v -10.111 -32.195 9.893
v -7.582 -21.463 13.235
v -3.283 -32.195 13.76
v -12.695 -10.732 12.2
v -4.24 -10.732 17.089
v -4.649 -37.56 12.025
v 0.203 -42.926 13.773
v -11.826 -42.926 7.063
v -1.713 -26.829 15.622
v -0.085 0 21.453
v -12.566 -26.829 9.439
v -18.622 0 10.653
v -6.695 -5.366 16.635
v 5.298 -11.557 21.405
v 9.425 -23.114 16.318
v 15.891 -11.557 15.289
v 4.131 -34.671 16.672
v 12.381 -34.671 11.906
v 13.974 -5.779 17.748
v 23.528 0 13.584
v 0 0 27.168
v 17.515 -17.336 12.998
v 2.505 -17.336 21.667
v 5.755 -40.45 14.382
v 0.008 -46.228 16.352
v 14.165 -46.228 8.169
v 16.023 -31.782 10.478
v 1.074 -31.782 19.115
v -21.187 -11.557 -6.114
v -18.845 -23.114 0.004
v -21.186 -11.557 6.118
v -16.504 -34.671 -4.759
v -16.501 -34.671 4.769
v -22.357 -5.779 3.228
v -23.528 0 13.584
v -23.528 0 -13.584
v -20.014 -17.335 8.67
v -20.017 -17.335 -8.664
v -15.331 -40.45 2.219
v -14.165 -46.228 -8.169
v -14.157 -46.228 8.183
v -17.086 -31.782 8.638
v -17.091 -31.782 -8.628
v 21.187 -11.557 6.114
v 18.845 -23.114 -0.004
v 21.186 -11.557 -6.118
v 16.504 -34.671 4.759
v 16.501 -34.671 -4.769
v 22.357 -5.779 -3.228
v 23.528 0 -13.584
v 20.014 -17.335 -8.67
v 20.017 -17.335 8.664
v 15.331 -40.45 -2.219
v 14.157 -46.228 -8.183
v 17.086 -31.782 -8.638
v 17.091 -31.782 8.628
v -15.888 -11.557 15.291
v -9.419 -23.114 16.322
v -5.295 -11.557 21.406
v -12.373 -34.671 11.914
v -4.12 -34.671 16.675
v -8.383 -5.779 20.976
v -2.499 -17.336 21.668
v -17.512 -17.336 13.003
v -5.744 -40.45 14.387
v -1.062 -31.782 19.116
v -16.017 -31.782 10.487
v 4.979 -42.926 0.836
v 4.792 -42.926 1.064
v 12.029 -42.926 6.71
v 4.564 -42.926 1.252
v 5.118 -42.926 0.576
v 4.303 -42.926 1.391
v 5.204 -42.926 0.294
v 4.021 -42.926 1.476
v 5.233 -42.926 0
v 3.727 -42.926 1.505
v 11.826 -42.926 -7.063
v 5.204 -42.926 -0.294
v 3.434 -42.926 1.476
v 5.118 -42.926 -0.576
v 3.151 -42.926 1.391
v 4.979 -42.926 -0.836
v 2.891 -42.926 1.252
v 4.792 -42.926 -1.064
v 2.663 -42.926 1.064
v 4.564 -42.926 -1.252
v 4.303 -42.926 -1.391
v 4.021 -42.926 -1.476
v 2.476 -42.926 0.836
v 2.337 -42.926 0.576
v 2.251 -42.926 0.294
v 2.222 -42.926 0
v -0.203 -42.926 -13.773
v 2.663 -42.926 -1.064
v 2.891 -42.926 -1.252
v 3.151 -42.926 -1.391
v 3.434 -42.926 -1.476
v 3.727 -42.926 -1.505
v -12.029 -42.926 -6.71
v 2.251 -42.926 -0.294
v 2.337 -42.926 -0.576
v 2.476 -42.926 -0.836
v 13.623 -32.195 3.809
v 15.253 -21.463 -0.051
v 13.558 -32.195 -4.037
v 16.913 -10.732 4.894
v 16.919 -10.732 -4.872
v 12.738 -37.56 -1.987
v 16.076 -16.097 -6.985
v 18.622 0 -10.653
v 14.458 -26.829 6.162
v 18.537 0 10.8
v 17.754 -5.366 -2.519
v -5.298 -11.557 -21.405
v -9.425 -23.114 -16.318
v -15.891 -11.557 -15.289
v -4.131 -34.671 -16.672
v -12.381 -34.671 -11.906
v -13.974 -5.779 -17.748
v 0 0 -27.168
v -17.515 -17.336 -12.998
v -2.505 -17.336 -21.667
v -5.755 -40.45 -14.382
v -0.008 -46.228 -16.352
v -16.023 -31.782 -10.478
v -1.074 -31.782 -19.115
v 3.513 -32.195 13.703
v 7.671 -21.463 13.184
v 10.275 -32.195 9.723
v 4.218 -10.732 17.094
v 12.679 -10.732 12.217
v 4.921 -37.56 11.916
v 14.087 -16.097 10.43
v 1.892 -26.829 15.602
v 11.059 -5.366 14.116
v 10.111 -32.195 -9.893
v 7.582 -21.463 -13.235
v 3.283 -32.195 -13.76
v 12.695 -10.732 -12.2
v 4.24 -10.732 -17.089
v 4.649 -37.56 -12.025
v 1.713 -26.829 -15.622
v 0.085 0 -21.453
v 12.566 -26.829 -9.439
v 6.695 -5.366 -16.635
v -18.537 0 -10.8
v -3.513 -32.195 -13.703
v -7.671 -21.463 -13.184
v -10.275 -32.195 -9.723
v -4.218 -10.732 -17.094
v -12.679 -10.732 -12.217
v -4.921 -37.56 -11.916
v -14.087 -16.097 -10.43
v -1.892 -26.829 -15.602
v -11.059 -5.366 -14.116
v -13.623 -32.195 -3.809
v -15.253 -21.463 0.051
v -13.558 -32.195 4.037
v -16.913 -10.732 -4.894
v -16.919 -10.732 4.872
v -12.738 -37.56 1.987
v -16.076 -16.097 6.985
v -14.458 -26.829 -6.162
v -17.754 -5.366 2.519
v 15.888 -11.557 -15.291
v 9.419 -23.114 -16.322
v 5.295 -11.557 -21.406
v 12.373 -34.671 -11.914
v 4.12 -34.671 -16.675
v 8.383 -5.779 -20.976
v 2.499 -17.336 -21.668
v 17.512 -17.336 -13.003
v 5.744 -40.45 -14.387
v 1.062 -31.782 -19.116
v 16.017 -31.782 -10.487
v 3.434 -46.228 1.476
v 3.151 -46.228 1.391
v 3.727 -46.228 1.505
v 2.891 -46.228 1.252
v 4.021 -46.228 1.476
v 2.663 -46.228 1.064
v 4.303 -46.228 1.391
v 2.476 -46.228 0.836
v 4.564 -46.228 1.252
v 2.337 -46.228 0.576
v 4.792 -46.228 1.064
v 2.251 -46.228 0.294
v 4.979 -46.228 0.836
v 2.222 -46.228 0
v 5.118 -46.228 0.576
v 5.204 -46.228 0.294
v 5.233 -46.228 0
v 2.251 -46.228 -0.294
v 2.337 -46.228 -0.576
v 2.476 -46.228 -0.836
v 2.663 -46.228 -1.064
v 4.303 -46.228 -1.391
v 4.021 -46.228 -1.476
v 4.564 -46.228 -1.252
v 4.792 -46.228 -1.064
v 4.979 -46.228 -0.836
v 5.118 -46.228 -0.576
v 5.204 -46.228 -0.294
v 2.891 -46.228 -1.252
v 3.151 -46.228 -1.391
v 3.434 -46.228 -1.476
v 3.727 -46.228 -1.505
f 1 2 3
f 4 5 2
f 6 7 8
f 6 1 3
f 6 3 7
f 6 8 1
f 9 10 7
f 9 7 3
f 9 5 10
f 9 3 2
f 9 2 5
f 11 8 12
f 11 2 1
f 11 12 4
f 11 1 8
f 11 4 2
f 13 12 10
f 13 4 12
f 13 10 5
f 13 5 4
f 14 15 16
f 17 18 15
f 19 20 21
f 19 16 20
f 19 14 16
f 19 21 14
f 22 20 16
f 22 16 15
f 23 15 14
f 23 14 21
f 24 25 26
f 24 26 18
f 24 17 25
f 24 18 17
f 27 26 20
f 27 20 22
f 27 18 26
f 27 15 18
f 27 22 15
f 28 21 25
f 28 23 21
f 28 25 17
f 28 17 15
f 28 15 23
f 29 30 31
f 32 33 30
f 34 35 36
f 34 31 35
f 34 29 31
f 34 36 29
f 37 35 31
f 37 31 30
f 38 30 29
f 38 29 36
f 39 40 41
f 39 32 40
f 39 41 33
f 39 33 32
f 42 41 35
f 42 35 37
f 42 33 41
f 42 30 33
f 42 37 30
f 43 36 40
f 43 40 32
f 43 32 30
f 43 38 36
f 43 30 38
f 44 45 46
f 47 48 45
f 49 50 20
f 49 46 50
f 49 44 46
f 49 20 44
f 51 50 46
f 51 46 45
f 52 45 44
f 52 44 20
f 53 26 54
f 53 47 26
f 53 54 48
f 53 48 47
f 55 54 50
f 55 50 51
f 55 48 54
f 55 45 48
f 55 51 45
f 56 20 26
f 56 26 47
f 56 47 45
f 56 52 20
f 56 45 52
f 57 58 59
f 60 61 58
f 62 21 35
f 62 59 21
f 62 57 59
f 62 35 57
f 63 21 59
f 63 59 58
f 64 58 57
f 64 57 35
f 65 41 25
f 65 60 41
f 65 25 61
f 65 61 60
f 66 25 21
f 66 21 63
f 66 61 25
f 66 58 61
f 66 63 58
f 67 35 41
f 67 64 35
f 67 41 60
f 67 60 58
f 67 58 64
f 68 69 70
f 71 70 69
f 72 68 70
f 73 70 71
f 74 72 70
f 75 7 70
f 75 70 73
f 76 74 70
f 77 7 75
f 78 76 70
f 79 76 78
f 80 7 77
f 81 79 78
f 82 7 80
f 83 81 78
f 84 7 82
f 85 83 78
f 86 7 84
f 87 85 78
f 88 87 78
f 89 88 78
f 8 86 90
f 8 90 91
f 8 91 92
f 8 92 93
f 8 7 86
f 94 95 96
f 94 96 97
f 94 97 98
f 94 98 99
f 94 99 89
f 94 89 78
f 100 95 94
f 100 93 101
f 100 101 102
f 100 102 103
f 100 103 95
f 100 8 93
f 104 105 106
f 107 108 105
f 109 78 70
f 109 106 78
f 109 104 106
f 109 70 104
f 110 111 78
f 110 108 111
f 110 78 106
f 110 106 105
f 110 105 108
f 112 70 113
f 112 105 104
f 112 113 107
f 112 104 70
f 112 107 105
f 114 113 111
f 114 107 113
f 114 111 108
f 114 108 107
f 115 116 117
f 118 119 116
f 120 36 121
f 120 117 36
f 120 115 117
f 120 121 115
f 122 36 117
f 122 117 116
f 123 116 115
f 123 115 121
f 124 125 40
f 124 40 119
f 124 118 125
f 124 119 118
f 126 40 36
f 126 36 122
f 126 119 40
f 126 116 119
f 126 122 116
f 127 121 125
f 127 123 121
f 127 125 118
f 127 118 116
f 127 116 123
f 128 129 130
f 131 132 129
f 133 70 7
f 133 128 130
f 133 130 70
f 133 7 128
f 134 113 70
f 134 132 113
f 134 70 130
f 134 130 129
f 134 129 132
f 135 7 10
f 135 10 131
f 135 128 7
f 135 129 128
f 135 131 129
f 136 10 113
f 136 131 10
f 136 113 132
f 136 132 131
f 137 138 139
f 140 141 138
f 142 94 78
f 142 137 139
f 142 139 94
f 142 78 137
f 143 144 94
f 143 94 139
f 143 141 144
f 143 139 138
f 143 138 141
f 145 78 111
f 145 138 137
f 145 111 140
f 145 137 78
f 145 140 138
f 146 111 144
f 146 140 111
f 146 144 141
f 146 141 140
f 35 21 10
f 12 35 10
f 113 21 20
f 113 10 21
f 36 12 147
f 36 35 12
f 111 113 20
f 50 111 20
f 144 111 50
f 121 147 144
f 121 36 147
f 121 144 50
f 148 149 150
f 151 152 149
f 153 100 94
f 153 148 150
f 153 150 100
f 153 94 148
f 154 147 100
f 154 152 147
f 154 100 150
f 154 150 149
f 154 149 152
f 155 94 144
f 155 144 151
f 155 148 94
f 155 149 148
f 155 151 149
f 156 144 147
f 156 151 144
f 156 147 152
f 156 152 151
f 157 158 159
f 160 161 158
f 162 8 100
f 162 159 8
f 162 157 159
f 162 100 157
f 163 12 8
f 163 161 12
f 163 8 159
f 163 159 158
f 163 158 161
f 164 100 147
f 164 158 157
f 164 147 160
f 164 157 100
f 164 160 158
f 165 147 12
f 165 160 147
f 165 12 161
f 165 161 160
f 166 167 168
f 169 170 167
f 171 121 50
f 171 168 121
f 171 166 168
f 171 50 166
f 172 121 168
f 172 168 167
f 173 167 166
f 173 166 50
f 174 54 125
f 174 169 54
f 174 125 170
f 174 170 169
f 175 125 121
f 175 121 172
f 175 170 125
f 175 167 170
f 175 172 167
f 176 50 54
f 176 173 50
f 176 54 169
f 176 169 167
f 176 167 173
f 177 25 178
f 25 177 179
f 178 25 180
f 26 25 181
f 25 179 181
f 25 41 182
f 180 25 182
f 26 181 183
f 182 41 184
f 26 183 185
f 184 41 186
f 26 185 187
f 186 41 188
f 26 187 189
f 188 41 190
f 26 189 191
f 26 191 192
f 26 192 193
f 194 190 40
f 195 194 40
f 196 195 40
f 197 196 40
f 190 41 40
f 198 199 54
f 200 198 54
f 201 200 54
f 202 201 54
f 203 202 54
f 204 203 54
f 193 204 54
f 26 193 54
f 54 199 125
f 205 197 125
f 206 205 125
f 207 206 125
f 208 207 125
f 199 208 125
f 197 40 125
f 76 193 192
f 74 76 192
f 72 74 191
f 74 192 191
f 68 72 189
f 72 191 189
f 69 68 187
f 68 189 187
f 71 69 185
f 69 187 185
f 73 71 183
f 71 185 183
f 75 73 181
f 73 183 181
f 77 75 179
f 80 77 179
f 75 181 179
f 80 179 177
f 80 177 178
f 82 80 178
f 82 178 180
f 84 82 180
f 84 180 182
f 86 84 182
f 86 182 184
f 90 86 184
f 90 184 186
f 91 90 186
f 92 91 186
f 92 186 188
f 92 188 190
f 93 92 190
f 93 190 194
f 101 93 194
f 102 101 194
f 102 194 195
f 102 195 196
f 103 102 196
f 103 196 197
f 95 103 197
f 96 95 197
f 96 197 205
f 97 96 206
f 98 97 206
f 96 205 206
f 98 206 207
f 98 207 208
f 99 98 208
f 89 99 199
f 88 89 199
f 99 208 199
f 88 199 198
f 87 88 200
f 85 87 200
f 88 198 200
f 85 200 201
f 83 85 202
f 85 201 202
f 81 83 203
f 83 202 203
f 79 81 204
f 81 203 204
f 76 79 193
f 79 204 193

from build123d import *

# Parameters (mm, degrees)
F10_R     = 1.5052256161
F11_DEPTH = 4.572


with BuildPart() as f3:
    # F0 (on Front) → F3 section 0
    with BuildSketch(Plane.XZ):
        Polygon((-23.5281828791, 13.5840027188), (-23.5281828791, -13.5840027188), (0, -27.1680054376), (23.5281828791, -13.5840027188), (23.5281828791, 13.5840027188), (0, 27.1680054376), align=None)
    # F2 (on offset) → F3 section 1
    with BuildSketch(Plane.XZ.offset(46.228)):
        Polygon((14.1652144193, 8.1686001212), (0.0083919913, 16.3517355978), (-14.156822428, 8.1831354766), (-14.1652144193, -8.1686001212), (-0.0083919913, -16.3517355978), (14.156822428, -8.1831354766), align=None)
    loft()

    # F7 (on offset) → F8 section 0
    with BuildSketch(Plane.XZ.offset(42.926)):
        Polygon((0.2034265982, 13.7726851485), (-11.8257819178, 7.0625151761), (-12.0292085161, -6.7101699724), (-0.2034265982, -13.7726851485), (11.8257819178, -7.0625151761), (12.0292085161, 6.7101699724), align=None)
    # F5 (on offset) → F8 section 1
    with BuildSketch(Plane(origin=(0, 1.778, 0), x_dir=(-1, 0, 0), z_dir=(0, 1, 0))):
        Polygon((0.0969416377, 21.7713832631), (-18.8061001625, 10.9696455524), (-18.9030418002, -10.8017377106), (-0.0969416377, -21.7713832631), (18.8061001625, -10.9696455524), (18.9030418002, 10.8017377106), align=None)
    loft(mode=Mode.SUBTRACT)

    # F10 (on offset) → F11 (cut)
    with BuildSketch(Plane.XZ.offset(46.228)):
        with Locations((3.7272993941, 0)):
            Circle(F10_R)
    extrude(amount=-F11_DEPTH, mode=Mode.SUBTRACT)


solid = f3.part
